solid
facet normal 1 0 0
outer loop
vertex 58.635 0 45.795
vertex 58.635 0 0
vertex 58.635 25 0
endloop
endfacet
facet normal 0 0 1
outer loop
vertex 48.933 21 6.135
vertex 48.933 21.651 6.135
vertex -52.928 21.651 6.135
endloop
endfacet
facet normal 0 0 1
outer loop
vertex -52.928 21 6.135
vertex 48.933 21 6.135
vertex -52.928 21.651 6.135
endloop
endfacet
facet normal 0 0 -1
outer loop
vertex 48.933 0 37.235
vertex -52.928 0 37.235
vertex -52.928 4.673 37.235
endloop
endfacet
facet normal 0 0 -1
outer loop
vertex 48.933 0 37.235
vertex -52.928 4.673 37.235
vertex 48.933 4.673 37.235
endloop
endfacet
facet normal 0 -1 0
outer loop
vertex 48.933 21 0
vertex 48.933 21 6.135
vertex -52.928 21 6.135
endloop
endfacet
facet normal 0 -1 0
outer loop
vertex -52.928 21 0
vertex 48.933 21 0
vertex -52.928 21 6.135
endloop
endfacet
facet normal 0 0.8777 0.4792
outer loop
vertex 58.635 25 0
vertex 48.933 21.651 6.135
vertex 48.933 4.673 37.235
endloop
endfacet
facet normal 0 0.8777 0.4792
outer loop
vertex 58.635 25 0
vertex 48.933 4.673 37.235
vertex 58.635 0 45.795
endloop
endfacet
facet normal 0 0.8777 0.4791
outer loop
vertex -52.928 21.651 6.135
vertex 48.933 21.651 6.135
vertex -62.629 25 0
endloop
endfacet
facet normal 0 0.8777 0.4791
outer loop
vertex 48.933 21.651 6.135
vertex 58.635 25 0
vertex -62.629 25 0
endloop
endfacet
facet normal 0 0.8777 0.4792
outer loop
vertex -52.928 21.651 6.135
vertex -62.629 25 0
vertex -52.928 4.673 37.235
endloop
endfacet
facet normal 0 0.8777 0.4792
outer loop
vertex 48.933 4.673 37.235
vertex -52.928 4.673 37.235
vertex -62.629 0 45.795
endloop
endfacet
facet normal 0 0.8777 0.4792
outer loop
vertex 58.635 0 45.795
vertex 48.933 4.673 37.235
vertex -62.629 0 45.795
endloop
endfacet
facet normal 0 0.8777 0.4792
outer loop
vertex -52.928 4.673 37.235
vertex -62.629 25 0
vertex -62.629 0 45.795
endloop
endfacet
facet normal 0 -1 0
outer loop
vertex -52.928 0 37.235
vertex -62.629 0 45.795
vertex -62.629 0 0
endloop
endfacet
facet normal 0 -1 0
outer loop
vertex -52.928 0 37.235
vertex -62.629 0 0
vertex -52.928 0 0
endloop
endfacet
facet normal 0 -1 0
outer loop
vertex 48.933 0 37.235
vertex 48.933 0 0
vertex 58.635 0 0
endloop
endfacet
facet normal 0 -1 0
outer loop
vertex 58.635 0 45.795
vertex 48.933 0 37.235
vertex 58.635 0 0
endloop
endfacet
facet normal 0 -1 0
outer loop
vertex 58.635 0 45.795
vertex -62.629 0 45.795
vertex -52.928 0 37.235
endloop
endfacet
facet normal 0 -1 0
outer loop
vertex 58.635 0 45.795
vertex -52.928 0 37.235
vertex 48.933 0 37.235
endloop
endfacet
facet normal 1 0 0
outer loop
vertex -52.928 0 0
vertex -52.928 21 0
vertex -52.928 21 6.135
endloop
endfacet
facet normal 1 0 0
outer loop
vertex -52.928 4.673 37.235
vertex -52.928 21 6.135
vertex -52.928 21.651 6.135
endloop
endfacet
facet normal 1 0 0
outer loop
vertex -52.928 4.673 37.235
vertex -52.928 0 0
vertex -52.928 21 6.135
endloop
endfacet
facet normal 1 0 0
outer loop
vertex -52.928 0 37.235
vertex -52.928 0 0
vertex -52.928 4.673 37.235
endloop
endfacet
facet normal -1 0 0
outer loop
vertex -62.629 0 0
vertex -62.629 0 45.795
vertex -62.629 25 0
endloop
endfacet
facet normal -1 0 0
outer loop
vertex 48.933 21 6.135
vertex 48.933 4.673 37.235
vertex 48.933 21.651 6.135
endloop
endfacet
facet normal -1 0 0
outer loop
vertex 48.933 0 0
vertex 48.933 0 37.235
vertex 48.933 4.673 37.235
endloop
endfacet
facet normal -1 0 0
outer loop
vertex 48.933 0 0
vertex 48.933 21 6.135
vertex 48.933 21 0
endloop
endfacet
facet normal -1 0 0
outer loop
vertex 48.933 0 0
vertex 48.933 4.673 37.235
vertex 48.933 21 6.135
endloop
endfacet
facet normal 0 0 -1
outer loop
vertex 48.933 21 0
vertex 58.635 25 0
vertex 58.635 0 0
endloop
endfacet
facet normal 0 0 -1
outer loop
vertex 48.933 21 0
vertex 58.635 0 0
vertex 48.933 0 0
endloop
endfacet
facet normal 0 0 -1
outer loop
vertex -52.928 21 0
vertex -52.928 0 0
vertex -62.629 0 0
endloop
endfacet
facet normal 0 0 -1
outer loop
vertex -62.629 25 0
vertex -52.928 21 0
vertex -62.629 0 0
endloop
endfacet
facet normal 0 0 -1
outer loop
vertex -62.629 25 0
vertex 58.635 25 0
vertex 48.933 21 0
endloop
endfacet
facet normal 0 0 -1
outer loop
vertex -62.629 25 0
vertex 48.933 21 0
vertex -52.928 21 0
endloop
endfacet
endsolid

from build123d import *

# Parameters (mm, degrees)
F1_DEPTH = 25
F2_W     = 101.8614172935
F2_H     = 6.1345109716
F3_DEPTH = 4
F5_DEPTH = 500


with BuildPart() as f1:
    # F0 (on Front) → F1 (new body)
    with BuildSketch(Plane.XZ):
        Polygon((-62.6290813088, 45.7948409021), (-62.6290813088, 0), (-52.927993238, 0), (-52.927993238, 37.2350551188), (48.9334240556, 37.2350551188), (48.9334240556, 0), (58.6345121264, 0), (58.6345121264, 45.7948409021), align=None)
    extrude(amount=-F1_DEPTH)

    # F2 (on face) → F3 (join)
    with BuildSketch(Plane(origin=(0, 25, 0), x_dir=(-1, 0, 0), z_dir=(0, 1, 0))):
        with Locations((1.9972845912, 3.0672554858)):
            Rectangle(F2_W, F2_H)
    extrude(amount=-F3_DEPTH)

    # F4 (on face) → F5 (cut)
    with BuildSketch(Plane(origin=(-62.6290813088, 0, 0), x_dir=(0, -1, 0), z_dir=(-1, 0, 0))):
        Polygon((-25, 0), (0, 45.7948409021), (-25, 45.7948409021), align=None)
    extrude(amount=-F5_DEPTH, mode=Mode.SUBTRACT)


solid = f1.part
